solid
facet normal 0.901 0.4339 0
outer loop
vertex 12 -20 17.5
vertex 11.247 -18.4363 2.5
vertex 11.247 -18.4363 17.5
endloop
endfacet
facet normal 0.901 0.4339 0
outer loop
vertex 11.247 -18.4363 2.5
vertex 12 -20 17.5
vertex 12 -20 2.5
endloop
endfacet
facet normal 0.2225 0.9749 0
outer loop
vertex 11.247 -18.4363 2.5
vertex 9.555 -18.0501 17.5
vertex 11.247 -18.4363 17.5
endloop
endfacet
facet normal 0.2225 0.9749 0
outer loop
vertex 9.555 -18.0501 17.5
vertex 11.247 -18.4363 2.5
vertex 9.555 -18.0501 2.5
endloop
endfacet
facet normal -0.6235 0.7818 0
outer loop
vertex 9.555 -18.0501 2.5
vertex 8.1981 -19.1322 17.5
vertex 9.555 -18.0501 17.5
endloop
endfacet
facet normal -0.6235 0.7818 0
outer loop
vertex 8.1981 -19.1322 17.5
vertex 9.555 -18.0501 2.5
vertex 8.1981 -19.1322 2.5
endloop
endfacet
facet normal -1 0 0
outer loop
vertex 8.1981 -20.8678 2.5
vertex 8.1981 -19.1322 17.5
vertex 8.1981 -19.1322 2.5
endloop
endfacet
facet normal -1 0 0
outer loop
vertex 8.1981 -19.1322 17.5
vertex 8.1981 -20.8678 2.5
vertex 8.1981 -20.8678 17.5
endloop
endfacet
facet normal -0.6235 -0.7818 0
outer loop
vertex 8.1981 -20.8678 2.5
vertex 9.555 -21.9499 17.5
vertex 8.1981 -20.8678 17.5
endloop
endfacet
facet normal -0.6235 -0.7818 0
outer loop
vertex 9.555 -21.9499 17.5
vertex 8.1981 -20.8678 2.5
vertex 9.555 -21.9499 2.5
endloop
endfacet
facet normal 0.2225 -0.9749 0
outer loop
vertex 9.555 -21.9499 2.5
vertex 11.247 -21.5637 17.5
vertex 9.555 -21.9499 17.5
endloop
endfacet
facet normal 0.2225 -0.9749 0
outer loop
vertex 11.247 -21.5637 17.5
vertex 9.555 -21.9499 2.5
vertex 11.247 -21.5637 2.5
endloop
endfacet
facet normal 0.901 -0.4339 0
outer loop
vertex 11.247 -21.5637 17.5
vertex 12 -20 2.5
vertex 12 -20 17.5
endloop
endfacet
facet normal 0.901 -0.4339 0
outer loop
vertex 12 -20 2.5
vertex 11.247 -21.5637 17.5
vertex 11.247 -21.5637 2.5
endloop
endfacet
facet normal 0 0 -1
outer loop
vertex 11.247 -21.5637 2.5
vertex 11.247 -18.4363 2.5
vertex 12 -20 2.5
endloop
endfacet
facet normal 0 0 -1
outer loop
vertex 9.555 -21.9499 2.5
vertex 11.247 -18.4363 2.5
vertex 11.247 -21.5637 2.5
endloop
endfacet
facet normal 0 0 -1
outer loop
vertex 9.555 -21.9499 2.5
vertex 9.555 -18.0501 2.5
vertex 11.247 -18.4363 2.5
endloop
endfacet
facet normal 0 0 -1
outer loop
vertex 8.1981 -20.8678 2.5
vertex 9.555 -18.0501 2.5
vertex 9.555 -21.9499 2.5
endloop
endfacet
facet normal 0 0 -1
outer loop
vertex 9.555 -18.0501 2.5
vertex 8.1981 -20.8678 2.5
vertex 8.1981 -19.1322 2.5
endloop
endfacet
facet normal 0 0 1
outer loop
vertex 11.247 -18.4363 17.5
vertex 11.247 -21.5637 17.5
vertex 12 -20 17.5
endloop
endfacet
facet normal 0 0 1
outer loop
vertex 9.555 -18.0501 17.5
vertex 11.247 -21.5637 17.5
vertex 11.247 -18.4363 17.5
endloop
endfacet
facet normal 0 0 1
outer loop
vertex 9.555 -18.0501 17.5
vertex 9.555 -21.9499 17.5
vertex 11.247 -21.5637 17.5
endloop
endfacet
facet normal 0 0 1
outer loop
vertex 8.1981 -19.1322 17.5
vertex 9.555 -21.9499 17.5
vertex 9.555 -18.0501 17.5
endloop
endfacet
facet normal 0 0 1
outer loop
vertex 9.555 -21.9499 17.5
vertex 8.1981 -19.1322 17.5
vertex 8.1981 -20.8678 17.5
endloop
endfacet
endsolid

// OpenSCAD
// Generated by generate_scads.py
translate([10,-20,10]) {
  cylinder(h=15, r=2, center=true);
}
